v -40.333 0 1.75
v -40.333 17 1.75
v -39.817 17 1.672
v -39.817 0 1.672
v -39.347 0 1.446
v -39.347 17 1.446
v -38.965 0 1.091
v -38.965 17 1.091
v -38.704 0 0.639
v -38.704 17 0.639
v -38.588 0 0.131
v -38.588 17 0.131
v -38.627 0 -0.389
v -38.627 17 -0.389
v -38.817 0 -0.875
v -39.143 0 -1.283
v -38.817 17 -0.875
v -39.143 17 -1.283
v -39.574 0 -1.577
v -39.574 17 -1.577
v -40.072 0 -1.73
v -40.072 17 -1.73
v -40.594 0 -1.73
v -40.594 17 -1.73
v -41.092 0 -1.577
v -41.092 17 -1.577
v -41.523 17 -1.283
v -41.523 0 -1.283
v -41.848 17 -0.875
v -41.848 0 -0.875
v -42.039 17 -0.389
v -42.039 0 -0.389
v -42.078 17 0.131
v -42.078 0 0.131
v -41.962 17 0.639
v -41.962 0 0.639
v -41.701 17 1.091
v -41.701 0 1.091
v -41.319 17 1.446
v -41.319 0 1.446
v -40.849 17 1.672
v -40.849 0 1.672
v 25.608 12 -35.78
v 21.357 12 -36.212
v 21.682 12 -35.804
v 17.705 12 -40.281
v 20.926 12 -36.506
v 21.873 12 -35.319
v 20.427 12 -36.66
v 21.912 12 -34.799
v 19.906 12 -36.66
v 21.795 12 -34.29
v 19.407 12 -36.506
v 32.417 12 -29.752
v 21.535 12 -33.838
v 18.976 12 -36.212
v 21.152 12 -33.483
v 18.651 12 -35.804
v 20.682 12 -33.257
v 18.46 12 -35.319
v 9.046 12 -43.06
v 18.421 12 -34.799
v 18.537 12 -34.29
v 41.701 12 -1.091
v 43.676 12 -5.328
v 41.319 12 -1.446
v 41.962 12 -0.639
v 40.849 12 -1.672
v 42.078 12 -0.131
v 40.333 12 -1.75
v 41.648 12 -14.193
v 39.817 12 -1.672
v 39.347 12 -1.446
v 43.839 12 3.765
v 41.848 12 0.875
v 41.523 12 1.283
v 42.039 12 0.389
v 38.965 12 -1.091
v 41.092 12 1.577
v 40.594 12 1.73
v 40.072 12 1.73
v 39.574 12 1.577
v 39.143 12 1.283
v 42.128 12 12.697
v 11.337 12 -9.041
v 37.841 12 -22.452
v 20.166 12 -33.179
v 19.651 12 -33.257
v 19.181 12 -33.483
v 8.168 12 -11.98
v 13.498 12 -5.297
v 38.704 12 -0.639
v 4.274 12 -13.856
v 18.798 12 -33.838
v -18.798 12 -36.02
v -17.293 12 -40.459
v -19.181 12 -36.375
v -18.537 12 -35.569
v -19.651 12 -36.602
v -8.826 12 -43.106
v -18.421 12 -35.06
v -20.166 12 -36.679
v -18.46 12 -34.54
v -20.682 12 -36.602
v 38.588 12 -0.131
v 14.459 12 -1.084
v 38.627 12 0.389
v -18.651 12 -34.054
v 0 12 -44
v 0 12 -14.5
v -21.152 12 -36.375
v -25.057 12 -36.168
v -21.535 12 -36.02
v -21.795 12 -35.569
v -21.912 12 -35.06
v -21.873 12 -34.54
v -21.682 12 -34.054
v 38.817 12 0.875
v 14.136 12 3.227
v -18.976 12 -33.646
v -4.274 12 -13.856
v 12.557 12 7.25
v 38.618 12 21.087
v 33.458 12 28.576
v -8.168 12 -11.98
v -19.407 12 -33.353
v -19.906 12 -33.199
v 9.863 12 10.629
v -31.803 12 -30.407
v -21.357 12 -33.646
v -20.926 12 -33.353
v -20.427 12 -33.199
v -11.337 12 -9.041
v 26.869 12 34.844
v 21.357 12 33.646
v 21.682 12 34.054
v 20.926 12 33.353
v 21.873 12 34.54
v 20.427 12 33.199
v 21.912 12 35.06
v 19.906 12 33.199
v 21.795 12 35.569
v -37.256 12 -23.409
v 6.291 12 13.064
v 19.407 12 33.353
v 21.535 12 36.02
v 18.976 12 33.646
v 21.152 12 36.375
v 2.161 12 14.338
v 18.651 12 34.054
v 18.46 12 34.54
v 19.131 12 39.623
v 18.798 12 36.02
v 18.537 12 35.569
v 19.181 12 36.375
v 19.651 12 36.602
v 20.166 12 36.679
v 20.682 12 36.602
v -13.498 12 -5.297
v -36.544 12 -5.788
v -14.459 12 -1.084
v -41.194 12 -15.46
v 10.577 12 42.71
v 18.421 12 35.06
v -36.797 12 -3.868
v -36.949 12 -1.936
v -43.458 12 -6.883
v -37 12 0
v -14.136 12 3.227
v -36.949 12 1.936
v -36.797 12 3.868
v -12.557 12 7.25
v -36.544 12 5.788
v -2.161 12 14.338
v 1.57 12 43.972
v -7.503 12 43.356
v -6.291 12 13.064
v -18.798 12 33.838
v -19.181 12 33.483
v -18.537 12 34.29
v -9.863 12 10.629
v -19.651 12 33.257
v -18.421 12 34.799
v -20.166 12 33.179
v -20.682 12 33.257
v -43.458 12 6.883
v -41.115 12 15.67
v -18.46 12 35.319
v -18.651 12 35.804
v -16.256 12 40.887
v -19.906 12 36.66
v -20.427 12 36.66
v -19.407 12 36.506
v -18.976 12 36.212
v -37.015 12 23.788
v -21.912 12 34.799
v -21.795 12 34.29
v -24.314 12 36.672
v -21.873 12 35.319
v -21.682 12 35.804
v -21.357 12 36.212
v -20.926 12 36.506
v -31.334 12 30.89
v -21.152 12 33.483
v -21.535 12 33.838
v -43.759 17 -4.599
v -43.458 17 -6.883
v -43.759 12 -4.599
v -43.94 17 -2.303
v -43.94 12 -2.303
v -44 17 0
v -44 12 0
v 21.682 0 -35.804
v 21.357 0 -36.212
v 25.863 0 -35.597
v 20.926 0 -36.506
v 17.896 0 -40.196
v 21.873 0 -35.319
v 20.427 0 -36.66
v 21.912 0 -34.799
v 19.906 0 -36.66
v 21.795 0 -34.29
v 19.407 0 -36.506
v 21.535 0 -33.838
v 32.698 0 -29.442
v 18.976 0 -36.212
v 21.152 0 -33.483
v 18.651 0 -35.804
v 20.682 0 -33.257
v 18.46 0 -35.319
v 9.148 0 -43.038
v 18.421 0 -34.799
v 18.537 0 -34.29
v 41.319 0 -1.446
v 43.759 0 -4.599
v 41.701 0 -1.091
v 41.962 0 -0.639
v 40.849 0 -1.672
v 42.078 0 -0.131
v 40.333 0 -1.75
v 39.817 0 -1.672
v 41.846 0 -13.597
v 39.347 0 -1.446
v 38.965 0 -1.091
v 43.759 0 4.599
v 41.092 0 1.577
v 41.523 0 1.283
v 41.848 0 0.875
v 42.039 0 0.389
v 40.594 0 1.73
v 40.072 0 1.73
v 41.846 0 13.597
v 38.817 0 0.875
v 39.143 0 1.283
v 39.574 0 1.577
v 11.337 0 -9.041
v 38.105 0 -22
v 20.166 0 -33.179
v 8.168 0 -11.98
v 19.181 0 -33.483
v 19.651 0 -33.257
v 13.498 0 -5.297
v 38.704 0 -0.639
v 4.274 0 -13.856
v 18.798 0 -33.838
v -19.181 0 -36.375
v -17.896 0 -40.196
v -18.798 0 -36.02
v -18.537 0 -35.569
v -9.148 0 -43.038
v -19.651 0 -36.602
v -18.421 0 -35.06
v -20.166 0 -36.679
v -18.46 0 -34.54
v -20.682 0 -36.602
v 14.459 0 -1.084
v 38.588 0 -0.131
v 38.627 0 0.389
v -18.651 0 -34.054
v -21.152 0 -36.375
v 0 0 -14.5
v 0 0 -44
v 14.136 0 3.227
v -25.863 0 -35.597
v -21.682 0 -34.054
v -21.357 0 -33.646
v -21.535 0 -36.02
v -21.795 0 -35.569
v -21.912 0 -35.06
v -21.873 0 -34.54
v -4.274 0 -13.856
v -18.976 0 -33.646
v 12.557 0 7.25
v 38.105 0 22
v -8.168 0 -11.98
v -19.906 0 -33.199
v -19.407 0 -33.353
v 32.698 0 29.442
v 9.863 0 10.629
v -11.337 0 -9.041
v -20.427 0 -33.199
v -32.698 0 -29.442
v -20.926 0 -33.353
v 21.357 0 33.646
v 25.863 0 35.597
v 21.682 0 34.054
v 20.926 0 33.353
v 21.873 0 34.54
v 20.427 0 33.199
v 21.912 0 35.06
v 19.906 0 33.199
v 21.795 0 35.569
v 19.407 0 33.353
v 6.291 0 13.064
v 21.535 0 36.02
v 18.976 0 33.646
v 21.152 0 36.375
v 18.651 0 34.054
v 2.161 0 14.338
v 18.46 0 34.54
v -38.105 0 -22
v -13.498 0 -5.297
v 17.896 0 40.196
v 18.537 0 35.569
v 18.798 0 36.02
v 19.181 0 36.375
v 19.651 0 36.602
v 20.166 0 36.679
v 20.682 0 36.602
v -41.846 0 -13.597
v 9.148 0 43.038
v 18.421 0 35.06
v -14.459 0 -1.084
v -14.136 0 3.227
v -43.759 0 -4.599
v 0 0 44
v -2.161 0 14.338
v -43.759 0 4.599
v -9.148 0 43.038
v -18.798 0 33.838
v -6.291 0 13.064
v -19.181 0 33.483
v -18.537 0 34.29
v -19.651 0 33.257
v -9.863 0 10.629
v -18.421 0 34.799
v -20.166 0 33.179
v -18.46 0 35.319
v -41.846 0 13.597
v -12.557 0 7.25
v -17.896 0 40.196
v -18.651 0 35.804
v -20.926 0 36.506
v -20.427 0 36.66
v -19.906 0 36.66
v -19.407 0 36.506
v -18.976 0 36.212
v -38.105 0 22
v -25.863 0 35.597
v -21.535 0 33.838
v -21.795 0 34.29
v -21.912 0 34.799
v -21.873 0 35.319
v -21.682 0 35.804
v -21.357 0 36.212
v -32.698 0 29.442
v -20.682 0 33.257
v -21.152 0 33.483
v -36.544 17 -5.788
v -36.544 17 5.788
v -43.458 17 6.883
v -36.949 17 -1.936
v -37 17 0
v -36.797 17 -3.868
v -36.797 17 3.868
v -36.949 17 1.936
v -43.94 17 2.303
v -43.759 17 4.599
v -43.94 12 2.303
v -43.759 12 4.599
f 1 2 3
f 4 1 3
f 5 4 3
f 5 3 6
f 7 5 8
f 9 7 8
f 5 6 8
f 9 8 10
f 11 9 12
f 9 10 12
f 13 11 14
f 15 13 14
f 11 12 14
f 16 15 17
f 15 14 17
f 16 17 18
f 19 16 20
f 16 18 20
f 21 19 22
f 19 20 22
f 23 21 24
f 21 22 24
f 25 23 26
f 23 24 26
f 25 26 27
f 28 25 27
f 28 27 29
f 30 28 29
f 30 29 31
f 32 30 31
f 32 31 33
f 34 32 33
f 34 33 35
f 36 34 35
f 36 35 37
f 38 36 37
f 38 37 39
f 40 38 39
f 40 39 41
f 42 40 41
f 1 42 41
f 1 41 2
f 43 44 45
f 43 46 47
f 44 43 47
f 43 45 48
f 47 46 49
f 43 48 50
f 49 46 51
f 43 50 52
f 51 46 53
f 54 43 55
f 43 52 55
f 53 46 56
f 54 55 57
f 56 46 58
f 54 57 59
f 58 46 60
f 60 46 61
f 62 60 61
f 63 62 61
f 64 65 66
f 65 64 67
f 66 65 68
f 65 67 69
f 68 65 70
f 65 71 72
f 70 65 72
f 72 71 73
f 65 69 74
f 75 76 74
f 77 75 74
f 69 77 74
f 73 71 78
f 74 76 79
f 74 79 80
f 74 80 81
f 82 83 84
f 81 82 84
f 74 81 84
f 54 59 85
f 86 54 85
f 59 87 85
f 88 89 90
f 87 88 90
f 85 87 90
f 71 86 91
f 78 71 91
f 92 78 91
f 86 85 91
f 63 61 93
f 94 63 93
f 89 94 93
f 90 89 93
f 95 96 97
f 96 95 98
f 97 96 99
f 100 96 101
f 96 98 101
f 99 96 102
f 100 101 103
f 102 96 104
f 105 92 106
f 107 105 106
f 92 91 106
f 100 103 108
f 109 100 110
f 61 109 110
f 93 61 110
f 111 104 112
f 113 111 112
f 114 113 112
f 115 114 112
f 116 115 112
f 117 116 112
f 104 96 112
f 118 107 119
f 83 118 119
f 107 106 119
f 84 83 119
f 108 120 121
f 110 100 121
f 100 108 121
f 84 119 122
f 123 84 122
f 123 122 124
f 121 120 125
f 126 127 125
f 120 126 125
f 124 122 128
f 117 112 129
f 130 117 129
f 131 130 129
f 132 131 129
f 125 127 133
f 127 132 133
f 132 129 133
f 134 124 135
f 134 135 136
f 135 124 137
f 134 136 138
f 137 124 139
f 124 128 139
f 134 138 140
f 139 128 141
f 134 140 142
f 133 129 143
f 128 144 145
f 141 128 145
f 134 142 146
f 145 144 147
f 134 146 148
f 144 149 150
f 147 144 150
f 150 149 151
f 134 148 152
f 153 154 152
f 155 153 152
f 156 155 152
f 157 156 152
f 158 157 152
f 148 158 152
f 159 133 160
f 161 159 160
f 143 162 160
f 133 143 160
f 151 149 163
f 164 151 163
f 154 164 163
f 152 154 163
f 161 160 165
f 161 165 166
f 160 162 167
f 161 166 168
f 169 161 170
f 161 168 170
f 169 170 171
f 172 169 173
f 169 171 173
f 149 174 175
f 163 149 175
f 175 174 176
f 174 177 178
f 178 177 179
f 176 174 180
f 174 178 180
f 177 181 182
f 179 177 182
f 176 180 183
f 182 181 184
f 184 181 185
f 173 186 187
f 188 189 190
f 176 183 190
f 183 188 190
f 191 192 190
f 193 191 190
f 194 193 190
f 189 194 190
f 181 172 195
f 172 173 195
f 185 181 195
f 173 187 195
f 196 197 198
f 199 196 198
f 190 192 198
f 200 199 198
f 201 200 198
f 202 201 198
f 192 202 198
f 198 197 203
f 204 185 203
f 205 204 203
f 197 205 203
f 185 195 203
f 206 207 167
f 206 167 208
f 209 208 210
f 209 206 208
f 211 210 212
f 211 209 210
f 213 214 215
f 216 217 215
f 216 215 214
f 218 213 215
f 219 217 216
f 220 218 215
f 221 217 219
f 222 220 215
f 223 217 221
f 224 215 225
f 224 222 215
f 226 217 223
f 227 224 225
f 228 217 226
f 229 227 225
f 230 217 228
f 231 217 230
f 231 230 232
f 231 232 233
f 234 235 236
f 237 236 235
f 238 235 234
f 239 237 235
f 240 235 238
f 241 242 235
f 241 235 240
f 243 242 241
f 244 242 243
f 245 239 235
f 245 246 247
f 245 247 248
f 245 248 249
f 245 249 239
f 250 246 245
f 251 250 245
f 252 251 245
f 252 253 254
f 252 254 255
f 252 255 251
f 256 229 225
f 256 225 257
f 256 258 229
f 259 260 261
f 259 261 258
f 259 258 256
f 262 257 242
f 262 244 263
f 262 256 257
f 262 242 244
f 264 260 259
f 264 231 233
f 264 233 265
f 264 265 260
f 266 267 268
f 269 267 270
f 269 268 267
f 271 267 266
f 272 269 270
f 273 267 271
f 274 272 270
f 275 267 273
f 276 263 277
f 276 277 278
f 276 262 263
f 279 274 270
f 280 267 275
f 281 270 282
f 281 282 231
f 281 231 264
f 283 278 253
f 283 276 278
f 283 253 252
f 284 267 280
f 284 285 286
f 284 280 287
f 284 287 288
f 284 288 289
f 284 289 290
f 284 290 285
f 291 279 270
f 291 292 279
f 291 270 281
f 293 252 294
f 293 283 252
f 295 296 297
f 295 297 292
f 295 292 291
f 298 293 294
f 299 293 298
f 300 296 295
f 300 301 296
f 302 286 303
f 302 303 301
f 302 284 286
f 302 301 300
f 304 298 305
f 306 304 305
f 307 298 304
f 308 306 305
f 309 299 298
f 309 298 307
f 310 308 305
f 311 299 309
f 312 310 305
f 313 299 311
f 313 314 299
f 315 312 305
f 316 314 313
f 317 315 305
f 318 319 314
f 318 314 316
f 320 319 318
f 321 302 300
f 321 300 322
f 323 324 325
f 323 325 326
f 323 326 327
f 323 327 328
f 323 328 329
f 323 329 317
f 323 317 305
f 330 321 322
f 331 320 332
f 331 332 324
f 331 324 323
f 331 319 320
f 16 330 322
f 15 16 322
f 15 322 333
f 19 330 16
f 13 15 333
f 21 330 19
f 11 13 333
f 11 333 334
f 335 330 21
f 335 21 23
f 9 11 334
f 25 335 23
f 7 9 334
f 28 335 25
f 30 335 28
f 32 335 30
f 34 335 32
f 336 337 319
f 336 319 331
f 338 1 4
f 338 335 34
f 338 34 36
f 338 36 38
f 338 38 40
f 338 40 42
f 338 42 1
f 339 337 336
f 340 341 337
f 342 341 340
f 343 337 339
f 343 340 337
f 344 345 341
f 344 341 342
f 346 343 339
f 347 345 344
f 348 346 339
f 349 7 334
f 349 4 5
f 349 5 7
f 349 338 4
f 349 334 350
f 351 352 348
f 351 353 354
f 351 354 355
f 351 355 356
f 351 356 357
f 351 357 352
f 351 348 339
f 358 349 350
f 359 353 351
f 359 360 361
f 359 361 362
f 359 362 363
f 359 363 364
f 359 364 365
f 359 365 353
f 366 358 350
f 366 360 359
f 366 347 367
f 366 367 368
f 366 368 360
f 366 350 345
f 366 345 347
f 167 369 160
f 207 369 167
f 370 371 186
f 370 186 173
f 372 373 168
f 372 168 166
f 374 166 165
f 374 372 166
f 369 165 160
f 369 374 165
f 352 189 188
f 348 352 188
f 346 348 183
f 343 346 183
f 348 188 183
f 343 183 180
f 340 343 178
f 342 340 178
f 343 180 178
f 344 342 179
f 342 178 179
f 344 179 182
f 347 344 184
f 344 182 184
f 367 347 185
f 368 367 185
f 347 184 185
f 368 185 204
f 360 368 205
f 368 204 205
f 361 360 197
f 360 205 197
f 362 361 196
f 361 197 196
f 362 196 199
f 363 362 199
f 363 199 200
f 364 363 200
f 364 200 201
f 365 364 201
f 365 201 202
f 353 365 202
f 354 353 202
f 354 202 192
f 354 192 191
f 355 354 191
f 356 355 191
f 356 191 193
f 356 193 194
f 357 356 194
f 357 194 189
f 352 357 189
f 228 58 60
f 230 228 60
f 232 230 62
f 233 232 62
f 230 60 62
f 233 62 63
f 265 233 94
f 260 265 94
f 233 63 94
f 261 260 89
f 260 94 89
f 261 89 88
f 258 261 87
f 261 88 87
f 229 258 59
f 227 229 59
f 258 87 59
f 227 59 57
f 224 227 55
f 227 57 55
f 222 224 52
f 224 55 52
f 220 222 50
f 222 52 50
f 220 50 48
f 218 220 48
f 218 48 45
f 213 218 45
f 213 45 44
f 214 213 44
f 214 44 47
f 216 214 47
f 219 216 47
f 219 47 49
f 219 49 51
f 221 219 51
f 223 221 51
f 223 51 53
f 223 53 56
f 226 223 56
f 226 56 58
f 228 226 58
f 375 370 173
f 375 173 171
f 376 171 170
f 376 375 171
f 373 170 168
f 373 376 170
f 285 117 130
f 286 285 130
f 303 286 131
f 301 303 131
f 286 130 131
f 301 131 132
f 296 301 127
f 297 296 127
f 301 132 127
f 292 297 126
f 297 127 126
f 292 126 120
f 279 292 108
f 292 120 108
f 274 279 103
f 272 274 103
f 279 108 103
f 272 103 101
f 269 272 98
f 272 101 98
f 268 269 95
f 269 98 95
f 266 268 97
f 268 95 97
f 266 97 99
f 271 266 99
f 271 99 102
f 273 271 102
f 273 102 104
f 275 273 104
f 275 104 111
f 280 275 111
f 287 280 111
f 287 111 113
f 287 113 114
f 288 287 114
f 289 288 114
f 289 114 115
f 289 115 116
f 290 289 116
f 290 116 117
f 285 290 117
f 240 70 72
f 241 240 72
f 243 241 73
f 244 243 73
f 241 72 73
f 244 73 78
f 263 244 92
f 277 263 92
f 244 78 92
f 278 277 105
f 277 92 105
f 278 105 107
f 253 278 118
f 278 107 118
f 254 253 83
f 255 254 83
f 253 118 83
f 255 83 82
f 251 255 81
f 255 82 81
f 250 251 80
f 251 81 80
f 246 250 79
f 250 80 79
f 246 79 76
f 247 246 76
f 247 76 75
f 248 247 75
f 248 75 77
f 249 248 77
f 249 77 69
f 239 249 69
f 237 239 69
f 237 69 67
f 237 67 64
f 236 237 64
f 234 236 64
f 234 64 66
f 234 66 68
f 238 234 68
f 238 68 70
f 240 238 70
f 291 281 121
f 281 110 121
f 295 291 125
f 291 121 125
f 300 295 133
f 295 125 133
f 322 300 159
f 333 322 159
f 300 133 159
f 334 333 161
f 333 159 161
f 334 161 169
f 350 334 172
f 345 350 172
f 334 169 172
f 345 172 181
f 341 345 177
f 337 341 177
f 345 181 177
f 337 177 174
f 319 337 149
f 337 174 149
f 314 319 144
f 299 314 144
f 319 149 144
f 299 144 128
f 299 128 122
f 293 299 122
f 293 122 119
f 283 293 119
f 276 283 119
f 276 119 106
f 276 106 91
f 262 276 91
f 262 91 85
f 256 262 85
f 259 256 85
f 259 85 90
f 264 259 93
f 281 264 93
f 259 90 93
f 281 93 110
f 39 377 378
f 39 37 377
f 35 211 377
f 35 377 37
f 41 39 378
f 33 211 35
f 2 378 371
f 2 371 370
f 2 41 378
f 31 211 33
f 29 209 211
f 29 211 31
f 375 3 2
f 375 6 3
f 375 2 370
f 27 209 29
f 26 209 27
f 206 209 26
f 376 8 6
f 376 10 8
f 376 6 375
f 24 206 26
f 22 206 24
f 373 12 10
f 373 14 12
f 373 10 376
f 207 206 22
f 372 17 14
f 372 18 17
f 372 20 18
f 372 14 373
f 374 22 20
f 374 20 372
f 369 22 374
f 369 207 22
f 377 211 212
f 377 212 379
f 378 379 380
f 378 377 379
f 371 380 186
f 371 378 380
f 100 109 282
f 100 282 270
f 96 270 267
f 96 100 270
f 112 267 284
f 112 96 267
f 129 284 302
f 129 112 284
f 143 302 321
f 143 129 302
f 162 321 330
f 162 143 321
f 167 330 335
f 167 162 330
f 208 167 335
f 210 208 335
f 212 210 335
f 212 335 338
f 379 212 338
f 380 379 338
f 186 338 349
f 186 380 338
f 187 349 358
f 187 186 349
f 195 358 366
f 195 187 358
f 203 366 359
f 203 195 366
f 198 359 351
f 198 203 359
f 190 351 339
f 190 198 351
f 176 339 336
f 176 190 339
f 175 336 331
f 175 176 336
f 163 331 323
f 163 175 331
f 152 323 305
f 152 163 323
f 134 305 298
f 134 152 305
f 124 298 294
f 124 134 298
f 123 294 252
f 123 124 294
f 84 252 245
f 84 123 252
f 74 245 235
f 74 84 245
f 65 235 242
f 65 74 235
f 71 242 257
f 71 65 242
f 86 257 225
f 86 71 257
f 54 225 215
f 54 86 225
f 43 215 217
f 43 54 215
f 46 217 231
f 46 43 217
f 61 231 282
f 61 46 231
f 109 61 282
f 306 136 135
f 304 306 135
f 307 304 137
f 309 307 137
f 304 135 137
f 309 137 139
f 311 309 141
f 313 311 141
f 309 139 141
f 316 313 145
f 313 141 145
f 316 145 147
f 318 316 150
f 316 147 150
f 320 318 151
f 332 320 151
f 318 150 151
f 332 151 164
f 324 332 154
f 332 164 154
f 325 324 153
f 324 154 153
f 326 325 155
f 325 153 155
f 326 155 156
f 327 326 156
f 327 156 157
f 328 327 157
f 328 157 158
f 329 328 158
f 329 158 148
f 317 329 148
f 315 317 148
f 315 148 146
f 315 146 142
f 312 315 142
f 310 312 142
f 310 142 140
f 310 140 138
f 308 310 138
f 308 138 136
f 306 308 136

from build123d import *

# Parameters (mm, degrees)
SKETCH1_W           = 29.5
SKETCH1_H           = 12
BOSS_EXTRUDE1_START = 5
BOSS_EXTRUDE1_DEPTH = 5
SKETCH3_R           = 1.75
CUT_EXTRUDE1_DEPTH  = 65.505813691
CIRPATTERN1_COUNT   = 6


with BuildPart() as part:
    # Sketch1 → Revolve1 (revolve)
    with BuildSketch(Plane.XY, mode=Mode.PRIVATE) as revolve1_sk:
        with Locations((29.25, 6)):
            Rectangle(SKETCH1_W, SKETCH1_H)
    revolve(revolve1_sk.sketch.rotate(Axis((0, 0, 0), (0, 1, 0)), 90), axis=Axis((0, 0, 0), (0, 1, 0)))

    # Sketch2 → Boss-Extrude1 (add)
    with BuildSketch(Plane(origin=(0, 12, 0), x_dir=(1, 0, 0), z_dir=(0, 1, 0)).offset(BOSS_EXTRUDE1_START)):
        with BuildLine():
            Line((-44, 0), (-37, 0))
            ThreePointArc((-37, 0), (-36.885941348, 2.902986542), (-36.544468602, 5.788075206))
            Line((-36.544468602, 5.788075206), (-43.458286986, 6.883116462))
            ThreePointArc((-43.458286986, 6.883116462), (-43.864362684, 3.452200212), (-44, 0))
        make_face()
        with BuildLine():
            ThreePointArc((-36.544468602, -5.788075206), (-36.885941348, -2.902986542), (-37, 0))
            Line((-37, 0), (-44, 0))
            ThreePointArc((-44, 0), (-43.864362684, -3.452200212), (-43.458286986, -6.883116462))
            Line((-43.458286986, -6.883116462), (-36.544468602, -5.788075206))
        make_face()
    extrude(amount=-BOSS_EXTRUDE1_DEPTH)

    # Sketch3 → Cut-Extrude1 (cut, through all)
    with BuildSketch(Plane(origin=(0, 17, 0), x_dir=(1, 0, 0), z_dir=(0, 1, 0))):
        with Locations(Location((-40.332863527, 0, 0), (0, 0, 270))):
            Circle(SKETCH3_R)
    cut_extrude1 = extrude(amount=-CUT_EXTRUDE1_DEPTH, mode=Mode.SUBTRACT)

    # CirPattern1: Cut-Extrude1 ×6 about axis
    cirpattern1_axis = Axis((0, 0, 0), (0, 1, 0))
    for i in range(1, CIRPATTERN1_COUNT):
        add(cut_extrude1.rotate(cirpattern1_axis, i * 360 / CIRPATTERN1_COUNT), mode=Mode.SUBTRACT)


solid = part.part
